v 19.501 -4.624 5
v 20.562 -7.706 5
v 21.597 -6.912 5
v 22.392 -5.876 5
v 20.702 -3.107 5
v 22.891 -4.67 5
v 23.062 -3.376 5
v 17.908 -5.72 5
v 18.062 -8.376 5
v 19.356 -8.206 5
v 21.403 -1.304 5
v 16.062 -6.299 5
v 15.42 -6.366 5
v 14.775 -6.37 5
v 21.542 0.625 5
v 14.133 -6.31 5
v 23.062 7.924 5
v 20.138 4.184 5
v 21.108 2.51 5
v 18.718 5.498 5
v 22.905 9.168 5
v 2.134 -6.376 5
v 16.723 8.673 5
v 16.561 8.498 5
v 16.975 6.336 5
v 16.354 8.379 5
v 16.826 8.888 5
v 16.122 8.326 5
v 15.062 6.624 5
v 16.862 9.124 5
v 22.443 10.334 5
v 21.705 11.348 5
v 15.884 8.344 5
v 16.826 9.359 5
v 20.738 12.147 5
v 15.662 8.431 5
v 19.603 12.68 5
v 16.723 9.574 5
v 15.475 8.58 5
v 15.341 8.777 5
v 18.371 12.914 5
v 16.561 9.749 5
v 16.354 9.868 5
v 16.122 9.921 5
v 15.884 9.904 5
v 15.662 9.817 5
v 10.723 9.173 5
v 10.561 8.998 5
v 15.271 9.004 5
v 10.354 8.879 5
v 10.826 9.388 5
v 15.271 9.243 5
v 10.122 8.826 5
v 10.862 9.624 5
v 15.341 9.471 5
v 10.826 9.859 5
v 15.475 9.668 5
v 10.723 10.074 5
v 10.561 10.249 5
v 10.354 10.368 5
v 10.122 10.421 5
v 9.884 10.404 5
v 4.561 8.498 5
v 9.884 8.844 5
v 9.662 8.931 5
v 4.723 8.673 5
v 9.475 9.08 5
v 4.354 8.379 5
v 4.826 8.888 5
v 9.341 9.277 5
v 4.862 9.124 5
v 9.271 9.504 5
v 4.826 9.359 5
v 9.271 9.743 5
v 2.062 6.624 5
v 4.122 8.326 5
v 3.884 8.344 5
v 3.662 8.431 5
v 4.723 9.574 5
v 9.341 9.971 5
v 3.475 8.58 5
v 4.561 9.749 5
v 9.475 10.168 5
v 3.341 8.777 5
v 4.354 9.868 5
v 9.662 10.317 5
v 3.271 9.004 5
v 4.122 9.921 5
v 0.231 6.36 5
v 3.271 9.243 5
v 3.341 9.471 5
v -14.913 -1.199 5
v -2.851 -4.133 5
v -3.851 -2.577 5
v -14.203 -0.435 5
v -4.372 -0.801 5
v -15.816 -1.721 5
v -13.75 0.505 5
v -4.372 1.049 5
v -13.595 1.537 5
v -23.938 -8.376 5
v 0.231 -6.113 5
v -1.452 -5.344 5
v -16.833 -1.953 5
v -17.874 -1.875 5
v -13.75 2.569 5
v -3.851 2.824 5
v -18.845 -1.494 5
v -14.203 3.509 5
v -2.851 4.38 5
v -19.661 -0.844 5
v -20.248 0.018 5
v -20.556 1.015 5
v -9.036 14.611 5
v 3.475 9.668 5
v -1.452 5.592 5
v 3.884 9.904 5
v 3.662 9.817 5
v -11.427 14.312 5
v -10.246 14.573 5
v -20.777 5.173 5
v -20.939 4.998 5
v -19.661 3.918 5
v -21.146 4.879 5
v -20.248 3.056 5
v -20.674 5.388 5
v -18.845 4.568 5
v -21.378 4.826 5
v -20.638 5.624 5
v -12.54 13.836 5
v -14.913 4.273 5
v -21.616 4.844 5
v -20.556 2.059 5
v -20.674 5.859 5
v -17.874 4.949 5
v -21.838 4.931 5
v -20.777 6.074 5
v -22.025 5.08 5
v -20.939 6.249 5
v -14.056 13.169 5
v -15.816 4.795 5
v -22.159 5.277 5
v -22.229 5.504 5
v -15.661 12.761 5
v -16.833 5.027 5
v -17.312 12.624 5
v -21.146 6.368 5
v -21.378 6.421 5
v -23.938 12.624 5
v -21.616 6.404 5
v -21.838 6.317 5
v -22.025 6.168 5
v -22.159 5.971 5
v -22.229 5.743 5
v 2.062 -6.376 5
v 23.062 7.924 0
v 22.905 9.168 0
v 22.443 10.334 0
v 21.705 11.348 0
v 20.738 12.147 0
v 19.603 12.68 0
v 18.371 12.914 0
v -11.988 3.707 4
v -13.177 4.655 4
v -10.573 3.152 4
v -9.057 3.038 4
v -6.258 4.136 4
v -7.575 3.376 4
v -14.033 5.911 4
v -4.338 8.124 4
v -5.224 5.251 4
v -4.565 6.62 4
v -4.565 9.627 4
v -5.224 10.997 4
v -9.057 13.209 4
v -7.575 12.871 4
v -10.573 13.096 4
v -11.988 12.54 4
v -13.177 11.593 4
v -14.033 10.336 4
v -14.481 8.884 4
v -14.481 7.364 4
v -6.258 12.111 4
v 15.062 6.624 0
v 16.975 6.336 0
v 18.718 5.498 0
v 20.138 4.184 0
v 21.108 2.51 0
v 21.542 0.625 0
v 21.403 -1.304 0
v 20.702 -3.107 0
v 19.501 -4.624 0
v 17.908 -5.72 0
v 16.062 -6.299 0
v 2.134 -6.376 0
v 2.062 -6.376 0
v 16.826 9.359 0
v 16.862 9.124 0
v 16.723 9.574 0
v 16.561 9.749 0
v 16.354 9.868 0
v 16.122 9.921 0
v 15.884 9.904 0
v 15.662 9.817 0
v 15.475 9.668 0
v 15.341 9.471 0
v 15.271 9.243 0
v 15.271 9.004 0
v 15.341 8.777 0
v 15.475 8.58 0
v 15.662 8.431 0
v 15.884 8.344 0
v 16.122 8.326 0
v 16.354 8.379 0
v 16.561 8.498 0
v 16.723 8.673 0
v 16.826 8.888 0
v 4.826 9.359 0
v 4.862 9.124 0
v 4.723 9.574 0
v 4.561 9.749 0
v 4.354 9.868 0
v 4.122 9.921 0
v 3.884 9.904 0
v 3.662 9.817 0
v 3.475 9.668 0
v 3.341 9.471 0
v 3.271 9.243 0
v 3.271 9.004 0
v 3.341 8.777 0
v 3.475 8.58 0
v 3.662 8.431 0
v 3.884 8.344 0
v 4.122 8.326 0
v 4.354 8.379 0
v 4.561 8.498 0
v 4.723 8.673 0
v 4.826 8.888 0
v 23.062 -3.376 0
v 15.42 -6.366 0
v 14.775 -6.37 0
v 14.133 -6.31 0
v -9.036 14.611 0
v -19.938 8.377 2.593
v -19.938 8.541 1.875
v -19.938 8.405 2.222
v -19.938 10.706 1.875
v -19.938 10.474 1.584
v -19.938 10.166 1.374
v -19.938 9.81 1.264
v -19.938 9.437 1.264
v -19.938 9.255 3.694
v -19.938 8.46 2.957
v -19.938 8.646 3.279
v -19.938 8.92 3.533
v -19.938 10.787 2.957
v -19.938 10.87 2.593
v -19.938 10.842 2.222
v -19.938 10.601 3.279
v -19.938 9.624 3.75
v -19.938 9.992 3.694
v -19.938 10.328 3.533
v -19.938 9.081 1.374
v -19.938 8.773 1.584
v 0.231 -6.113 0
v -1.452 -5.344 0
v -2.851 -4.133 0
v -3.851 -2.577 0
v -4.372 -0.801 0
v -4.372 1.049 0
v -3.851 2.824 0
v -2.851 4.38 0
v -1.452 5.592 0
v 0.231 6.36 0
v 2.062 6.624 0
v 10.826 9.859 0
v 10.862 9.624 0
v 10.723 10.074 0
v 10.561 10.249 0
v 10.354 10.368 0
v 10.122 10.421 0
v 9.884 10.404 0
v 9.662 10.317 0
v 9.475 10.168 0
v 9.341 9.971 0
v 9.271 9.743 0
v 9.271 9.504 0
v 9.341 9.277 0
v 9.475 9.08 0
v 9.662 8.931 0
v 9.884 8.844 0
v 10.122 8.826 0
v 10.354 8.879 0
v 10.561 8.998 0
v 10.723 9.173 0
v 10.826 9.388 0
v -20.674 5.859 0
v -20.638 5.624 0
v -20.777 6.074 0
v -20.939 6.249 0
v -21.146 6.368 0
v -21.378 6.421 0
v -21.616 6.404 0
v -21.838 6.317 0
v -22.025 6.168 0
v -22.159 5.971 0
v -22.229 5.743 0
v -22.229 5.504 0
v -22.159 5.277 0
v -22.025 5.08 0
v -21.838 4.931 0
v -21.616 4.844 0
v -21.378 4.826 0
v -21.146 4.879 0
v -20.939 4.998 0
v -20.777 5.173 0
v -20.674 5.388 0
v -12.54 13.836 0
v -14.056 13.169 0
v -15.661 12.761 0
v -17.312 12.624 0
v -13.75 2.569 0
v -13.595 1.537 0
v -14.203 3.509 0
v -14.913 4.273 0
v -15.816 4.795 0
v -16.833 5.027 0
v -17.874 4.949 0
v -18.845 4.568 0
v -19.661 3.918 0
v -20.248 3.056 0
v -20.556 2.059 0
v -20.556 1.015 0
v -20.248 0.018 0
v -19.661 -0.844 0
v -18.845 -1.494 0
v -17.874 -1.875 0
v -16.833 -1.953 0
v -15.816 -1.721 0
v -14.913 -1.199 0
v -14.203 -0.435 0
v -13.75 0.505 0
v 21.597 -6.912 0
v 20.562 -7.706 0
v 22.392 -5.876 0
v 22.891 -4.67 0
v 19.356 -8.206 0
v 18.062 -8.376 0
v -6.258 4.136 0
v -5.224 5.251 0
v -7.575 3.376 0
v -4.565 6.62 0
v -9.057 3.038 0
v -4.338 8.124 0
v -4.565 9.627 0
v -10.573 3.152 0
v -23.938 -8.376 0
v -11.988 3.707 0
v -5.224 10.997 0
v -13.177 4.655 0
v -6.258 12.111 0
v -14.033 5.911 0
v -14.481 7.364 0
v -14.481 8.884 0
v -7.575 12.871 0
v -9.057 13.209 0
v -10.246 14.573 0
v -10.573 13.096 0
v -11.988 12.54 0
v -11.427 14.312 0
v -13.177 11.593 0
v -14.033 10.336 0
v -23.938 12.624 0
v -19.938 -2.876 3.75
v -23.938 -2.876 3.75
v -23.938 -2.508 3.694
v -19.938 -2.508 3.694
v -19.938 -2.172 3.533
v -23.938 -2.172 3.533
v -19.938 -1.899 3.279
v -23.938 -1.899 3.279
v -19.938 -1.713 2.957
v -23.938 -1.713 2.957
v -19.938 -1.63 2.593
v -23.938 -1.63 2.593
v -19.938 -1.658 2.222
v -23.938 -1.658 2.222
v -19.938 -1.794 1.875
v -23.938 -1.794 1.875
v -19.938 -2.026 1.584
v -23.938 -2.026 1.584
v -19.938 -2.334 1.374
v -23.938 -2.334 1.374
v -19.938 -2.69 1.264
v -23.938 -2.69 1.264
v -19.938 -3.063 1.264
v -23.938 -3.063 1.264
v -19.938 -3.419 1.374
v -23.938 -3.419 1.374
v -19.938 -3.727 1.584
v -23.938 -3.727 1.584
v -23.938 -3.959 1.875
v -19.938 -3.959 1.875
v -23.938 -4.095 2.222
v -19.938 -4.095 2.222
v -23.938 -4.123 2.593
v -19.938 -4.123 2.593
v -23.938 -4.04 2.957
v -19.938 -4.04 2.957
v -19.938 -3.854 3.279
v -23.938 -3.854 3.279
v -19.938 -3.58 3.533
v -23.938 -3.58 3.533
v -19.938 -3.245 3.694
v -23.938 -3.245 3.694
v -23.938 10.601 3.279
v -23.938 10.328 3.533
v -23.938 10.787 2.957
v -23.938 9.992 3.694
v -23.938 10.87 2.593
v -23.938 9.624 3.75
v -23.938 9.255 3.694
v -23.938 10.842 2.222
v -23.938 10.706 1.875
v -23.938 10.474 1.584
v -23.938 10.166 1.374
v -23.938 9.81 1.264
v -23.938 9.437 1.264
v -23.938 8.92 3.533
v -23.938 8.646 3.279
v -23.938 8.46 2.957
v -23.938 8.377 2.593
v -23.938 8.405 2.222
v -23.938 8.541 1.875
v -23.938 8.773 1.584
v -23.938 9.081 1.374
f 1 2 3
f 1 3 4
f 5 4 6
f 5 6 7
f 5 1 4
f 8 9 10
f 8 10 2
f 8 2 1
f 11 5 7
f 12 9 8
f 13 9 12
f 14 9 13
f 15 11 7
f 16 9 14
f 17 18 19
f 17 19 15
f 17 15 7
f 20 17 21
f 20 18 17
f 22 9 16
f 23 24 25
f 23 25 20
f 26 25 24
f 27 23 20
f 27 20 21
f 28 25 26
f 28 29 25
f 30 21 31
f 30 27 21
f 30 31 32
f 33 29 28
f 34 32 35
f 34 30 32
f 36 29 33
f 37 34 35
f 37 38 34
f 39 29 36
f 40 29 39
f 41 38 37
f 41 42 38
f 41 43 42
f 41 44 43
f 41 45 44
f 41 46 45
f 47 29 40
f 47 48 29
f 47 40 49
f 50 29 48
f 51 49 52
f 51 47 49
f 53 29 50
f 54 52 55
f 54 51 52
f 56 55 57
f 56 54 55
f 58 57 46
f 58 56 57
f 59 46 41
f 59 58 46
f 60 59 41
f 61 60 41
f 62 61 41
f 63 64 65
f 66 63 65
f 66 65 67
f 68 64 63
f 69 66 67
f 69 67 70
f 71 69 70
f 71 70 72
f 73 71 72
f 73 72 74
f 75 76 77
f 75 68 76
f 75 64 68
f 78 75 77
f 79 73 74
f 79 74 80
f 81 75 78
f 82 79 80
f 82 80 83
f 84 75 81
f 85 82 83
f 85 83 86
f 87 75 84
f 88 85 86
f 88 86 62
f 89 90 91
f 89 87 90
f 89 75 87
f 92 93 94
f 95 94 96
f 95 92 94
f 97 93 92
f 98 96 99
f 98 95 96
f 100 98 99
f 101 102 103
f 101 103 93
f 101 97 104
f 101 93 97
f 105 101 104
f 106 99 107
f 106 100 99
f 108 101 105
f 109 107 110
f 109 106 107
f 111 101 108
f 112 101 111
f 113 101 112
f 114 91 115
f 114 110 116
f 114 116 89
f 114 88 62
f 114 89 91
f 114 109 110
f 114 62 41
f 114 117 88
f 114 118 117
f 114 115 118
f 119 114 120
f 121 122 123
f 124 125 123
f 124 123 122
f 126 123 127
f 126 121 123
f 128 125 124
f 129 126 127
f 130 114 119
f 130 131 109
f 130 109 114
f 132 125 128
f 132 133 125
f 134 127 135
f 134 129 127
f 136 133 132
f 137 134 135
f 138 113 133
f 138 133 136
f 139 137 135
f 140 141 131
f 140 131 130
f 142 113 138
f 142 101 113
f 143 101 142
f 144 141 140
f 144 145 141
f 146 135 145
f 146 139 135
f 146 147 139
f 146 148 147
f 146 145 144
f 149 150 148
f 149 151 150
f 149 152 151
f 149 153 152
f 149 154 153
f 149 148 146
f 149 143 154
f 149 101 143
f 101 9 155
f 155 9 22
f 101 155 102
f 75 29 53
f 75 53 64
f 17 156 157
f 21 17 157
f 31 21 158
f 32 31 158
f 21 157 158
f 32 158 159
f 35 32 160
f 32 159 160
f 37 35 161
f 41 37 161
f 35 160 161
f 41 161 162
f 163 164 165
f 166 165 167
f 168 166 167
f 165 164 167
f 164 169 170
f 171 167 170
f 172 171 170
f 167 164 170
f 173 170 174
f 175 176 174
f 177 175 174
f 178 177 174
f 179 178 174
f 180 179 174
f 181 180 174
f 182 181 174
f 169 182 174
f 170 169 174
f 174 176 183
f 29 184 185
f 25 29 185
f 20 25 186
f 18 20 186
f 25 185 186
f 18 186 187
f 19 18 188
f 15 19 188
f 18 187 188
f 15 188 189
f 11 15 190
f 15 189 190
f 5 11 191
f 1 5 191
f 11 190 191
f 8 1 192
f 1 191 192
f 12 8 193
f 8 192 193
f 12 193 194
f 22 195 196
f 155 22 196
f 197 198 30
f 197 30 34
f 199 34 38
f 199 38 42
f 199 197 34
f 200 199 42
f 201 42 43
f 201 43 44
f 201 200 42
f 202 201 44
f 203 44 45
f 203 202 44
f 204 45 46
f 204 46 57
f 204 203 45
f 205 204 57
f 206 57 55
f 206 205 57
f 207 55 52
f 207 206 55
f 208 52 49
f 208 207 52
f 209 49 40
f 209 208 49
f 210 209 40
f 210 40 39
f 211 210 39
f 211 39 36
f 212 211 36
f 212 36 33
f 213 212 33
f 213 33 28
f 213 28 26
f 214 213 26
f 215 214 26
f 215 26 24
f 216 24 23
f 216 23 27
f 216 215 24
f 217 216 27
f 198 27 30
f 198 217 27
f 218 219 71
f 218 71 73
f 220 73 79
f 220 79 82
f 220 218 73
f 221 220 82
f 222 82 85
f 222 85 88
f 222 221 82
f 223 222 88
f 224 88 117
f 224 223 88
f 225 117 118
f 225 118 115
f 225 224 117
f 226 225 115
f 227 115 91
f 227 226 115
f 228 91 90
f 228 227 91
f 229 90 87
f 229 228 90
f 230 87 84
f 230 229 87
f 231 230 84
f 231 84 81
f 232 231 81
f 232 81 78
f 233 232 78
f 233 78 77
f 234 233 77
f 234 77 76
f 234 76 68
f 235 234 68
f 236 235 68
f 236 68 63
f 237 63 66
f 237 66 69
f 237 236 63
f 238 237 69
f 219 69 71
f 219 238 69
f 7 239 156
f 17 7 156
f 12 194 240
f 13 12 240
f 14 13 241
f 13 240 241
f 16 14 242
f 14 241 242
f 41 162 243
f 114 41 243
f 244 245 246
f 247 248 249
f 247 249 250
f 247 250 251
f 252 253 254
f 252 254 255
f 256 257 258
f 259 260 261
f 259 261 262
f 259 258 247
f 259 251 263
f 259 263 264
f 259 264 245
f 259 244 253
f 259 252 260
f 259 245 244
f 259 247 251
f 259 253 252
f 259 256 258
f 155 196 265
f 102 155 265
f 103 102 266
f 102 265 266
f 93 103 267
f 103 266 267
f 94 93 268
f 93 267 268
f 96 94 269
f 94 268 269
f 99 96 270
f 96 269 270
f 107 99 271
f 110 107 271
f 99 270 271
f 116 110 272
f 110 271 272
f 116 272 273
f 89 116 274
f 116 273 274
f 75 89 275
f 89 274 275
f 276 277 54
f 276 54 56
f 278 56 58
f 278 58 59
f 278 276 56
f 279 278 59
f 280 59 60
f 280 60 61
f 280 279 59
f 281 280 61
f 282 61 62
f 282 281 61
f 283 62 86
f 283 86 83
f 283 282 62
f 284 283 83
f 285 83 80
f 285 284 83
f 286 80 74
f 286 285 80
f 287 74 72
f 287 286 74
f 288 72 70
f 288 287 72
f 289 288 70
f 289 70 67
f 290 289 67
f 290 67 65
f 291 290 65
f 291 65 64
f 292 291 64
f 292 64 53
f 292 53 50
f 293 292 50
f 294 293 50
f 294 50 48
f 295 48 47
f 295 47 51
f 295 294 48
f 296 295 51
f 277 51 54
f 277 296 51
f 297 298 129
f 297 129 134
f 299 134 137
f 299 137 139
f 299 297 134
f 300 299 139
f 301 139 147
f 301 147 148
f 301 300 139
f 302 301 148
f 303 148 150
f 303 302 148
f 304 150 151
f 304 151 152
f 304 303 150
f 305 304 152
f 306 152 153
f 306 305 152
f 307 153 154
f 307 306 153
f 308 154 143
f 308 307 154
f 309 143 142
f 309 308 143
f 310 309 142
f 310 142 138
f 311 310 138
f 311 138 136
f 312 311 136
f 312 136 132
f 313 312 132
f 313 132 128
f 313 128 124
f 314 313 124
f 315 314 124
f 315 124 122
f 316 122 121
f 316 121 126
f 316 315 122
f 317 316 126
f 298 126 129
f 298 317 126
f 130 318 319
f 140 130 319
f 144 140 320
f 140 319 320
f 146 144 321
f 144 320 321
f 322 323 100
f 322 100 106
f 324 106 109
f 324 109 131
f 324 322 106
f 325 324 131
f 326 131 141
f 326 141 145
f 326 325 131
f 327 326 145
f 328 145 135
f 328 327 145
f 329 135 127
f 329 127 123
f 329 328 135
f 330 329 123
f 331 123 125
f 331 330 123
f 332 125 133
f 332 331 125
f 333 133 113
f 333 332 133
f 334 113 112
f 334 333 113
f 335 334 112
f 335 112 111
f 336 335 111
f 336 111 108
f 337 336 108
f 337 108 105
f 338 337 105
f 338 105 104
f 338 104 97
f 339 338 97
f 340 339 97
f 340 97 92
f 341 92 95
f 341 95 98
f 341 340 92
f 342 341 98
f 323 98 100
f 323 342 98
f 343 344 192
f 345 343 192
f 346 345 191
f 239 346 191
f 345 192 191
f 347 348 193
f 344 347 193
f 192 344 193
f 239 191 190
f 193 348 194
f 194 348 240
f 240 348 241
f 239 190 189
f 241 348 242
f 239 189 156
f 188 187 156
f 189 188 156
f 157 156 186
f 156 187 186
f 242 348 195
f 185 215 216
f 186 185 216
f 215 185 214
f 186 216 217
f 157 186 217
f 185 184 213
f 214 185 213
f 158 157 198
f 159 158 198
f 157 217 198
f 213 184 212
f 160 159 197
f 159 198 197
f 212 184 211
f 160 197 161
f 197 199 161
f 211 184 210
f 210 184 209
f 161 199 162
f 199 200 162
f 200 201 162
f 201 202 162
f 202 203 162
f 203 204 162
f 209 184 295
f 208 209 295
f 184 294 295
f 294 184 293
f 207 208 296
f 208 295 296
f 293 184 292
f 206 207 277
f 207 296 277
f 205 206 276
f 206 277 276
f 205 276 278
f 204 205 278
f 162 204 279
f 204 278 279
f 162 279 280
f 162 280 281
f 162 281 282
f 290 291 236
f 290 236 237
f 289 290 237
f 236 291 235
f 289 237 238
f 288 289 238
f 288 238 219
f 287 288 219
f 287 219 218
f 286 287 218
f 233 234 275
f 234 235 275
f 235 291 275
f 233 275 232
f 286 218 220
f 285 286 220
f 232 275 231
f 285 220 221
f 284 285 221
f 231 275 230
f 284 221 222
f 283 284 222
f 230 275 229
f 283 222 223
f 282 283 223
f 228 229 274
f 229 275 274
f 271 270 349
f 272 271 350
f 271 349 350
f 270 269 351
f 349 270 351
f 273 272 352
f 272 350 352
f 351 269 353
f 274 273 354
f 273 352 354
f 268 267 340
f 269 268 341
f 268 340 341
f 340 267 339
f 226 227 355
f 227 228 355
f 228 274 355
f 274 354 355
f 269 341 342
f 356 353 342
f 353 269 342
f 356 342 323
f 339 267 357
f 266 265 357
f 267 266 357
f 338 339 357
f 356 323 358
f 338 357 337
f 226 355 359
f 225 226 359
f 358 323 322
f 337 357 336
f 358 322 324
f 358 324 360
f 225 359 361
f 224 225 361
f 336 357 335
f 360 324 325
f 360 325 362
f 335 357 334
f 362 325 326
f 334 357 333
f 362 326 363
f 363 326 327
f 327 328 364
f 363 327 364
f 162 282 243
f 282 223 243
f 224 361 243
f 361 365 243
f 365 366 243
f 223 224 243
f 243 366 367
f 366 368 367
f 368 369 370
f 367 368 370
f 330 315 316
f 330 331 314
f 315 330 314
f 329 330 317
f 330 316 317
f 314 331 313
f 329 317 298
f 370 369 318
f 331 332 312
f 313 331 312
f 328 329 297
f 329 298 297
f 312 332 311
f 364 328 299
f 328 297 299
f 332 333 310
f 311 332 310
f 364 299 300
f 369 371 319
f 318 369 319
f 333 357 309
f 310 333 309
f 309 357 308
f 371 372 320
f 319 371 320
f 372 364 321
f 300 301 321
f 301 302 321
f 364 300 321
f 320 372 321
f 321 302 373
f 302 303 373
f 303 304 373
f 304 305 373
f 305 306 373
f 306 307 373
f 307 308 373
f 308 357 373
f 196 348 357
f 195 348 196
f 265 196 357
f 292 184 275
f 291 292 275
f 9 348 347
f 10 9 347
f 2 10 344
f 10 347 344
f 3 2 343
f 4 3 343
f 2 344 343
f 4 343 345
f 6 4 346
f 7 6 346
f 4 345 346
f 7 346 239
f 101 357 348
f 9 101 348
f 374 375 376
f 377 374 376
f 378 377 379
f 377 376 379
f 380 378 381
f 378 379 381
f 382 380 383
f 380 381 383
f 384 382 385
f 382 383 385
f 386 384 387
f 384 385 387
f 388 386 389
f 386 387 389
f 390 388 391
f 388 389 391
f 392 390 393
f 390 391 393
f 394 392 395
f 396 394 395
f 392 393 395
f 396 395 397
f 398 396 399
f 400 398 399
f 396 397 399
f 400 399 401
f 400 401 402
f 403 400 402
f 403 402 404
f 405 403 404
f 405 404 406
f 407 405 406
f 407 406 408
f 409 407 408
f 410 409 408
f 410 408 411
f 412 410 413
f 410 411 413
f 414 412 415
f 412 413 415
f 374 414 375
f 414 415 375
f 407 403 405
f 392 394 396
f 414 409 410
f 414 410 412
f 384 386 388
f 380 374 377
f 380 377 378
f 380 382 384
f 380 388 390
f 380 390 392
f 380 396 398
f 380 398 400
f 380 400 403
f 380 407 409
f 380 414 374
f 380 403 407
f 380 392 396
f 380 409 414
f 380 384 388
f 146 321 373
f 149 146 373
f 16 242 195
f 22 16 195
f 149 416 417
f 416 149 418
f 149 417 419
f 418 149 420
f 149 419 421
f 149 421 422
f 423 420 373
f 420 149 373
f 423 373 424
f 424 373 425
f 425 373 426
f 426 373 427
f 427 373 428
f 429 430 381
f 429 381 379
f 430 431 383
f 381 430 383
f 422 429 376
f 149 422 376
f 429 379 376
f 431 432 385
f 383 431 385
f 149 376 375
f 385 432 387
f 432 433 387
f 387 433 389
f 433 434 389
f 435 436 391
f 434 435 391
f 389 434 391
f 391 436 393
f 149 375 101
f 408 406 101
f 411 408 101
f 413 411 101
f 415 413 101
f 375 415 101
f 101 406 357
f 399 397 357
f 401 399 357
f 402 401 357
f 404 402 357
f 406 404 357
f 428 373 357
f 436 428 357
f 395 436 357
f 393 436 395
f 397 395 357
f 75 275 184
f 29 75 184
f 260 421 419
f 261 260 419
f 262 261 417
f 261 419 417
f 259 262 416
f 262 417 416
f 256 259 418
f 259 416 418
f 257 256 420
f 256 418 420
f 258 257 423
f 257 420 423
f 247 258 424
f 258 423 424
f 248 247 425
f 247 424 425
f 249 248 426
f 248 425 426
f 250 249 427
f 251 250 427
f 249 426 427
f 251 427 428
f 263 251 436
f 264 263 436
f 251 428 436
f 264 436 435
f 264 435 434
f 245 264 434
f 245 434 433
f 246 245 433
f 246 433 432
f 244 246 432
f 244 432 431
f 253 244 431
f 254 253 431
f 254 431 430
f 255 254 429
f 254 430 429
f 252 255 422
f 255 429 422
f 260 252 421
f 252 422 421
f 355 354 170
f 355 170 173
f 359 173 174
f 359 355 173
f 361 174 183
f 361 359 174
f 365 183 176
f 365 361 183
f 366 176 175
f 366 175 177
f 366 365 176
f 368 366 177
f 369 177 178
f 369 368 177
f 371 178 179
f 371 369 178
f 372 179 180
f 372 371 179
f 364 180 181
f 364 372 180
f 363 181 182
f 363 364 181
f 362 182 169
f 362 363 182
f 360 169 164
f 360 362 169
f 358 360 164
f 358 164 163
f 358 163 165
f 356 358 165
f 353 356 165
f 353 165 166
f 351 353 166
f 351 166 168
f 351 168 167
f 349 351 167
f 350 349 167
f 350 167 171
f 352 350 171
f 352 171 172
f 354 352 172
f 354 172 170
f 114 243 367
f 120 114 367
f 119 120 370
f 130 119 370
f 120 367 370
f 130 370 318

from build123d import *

# Parameters (mm, degrees)
SKETCH1_R           = 0.8
SKETCH1_R_2         = 3.5
SKETCH1_R_3         = 5.1
BOSS_EXTRUDE1_DEPTH = 5
SKETCH2_R           = 1.25
CUT_EXTRUDE1_DEPTH  = 4
BOSS_EXTRUDE2_START = -1
SKETCH21_R          = 5.1
BOSS_EXTRUDE2_DEPTH = 1


with BuildPart() as part:
    # Sketch1 → Boss-Extrude1 (new body)
    with BuildSketch(Plane(origin=(0, 0, 0), x_dir=(0, 1, 0), z_dir=(0, 0, 1))):
        with BuildLine():
            ThreePointArc((7.923715338, -23.061842121), (11.348253353, -21.704991773), (12.914157128, -18.370857874))
            Line((12.914157128, -18.370857874), (14.611258571, 9.036437401))
            ThreePointArc((14.611258571, 9.036437401), (14.470096631, 10.842810788), (13.835805455, 12.540039768))
            ThreePointArc((13.835805455, 12.540039768), (12.931450551, 14.850335933), (12.623684243, 17.312165753))
            Line((12.623684243, 17.312165753), (12.623684243, 23.938157879))
            Line((12.623684243, 23.938157879), (-8.376315757, 23.938157879))
            Line((-8.376315757, 23.938157879), (-8.376315757, -18.061842121))
            ThreePointArc((-8.376315757, -18.061842121), (-6.911849663, -21.597376027), (-3.376315757, -23.061842121))
            Line((-3.376315757, -23.061842121), (7.923715338, -23.061842121))
        make_face()
        with BuildLine():
            Line((-6.37591859, -2.133696229), (-6.376315757, -2.061842121))
            ThreePointArc((-6.376315757, -2.061842121), (0.123684243, 4.438157879), (6.623684243, -2.061842121))
            Line((6.623684243, -2.061842121), (6.623684243, -15.061842121))
            ThreePointArc((6.623684243, -15.061842121), (0.625179068, -21.542467318), (-6.298932046, -16.061842121))
            ThreePointArc((-6.298932046, -16.061842121), (-6.376216465, -15.097769724), (-6.309594086, -14.132901895))
            Line((-6.309594086, -14.132901895), (-6.37591859, -2.133696229))
        make_face(mode=Mode.SUBTRACT)
        with Locations(Location((9.123684243, -16.061842121, 0), (0, 0, 270))):
            Circle(SKETCH1_R, mode=Mode.SUBTRACT)
        with Locations(Location((9.623684243, -10.061842121, 0), (0, 0, 270))):
            Circle(SKETCH1_R, mode=Mode.SUBTRACT)
        with Locations(Location((9.123684243, -4.061842121, 0), (0, 0, 270))):
            Circle(SKETCH1_R, mode=Mode.SUBTRACT)
        with Locations(Location((1.537022692, 17.094912388, 0), (0, 0, 270))):
            Circle(SKETCH1_R_2, mode=Mode.SUBTRACT)
        with Locations(Location((8.123684243, 9.438157879, 0), (0, 0, 270))):
            Circle(SKETCH1_R_3, mode=Mode.SUBTRACT)
        with Locations(Location((5.623684243, 21.438157879, 0), (0, 0, 270))):
            Circle(SKETCH1_R, mode=Mode.SUBTRACT)
    extrude(amount=BOSS_EXTRUDE1_DEPTH)

    # Sketch2 → Cut-Extrude1 (cut)
    with BuildSketch(Plane(origin=(-23.938157879, 0, 0), x_dir=(0, -1, 0), z_dir=(-1, 0, 0))):
        with Locations(Location((-9.623684243, 2.5, 0), (0, 0, 90))):
            Circle(SKETCH2_R)
        with Locations(Location((2.876315757, 2.5, 0), (0, 0, 90))):
            Circle(SKETCH2_R)
    extrude(amount=-CUT_EXTRUDE1_DEPTH, mode=Mode.SUBTRACT)

    # Sketch21 → Boss-Extrude2 (add)
    with BuildSketch(Plane.XY.offset(5).offset(BOSS_EXTRUDE2_START)):
        with Locations((-9.438157879, 8.123684243)):
            Circle(SKETCH21_R)
    extrude(amount=BOSS_EXTRUDE2_DEPTH)


solid = part.part
